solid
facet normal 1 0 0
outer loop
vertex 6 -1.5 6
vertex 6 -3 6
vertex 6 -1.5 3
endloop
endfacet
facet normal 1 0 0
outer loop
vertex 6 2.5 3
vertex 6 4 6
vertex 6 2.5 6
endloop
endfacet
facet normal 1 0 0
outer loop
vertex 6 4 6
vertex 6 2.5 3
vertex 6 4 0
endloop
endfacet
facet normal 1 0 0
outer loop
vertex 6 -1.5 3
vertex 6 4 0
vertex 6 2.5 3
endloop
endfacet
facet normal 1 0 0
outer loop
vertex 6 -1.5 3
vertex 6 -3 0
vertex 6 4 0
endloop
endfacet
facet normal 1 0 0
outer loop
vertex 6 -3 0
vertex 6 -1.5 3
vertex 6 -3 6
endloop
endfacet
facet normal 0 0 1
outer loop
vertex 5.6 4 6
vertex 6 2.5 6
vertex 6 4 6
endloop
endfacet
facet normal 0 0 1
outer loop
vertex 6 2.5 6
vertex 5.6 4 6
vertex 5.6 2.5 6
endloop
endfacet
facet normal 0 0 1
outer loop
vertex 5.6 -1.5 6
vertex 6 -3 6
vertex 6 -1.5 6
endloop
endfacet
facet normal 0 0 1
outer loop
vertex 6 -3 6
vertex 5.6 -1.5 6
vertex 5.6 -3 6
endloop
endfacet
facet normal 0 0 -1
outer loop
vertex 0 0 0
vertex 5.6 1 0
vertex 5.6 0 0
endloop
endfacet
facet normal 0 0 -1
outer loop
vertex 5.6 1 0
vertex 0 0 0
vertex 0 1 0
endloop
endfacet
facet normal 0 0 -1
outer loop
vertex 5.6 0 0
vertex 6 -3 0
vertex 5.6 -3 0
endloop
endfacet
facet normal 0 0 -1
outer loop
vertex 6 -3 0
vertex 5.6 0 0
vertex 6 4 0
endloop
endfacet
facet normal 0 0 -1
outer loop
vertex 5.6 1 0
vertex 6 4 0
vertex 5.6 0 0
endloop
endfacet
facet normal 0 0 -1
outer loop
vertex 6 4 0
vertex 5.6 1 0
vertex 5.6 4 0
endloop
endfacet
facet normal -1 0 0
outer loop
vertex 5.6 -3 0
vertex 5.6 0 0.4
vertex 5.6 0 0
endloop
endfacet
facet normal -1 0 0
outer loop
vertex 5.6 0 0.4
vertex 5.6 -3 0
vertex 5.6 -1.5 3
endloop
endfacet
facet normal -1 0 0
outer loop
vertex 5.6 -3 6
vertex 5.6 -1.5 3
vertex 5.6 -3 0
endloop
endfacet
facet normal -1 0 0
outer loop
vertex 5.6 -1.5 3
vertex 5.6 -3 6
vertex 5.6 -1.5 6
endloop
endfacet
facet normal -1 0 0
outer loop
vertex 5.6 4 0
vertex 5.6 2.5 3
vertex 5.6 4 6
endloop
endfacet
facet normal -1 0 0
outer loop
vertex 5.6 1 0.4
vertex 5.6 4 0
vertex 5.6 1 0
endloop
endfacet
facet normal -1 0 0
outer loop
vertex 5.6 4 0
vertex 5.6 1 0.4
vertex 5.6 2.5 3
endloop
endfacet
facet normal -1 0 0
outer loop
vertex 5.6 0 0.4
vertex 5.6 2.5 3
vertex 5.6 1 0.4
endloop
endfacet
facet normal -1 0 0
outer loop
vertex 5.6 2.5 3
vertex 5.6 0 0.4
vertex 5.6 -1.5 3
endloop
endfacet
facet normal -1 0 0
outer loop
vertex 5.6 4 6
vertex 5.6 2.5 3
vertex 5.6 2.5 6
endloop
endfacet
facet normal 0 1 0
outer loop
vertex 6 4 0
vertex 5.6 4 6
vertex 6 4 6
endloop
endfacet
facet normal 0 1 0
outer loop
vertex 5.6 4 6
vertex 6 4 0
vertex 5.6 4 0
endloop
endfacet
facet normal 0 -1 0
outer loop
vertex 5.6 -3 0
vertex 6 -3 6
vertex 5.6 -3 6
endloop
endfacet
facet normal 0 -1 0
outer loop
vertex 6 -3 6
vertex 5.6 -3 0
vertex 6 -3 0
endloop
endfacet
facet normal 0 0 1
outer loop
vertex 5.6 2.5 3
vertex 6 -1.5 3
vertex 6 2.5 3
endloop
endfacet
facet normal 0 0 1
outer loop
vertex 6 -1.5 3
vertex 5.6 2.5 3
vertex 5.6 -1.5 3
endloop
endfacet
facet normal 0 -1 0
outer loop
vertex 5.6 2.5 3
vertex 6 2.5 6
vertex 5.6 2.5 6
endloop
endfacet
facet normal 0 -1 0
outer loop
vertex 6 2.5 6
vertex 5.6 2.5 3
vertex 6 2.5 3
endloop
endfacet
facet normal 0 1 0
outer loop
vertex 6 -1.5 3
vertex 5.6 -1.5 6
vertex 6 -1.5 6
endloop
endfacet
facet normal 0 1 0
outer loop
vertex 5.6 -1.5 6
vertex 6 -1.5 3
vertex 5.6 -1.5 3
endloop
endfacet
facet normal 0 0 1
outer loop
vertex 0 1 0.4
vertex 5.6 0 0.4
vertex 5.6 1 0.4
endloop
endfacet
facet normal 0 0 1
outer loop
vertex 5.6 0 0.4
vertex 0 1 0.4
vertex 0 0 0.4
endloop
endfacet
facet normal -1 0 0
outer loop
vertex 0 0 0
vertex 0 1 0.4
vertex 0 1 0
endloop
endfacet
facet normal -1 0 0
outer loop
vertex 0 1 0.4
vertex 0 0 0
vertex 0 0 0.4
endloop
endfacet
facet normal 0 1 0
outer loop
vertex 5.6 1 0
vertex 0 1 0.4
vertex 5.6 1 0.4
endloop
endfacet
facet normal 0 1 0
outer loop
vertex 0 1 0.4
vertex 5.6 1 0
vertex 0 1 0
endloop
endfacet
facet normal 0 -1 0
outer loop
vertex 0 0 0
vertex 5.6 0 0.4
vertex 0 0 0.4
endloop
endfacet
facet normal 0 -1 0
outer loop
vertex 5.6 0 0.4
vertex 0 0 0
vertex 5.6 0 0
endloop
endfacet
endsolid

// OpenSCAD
cube([6,1,0.4]);
 
difference() {
    translate([5.6,-3,0]) {
        cube([0.4,7,6]);
    }
    
    translate([5.5,-1.5,3]) {
        cube([0.6,4,8]);
    }
}
